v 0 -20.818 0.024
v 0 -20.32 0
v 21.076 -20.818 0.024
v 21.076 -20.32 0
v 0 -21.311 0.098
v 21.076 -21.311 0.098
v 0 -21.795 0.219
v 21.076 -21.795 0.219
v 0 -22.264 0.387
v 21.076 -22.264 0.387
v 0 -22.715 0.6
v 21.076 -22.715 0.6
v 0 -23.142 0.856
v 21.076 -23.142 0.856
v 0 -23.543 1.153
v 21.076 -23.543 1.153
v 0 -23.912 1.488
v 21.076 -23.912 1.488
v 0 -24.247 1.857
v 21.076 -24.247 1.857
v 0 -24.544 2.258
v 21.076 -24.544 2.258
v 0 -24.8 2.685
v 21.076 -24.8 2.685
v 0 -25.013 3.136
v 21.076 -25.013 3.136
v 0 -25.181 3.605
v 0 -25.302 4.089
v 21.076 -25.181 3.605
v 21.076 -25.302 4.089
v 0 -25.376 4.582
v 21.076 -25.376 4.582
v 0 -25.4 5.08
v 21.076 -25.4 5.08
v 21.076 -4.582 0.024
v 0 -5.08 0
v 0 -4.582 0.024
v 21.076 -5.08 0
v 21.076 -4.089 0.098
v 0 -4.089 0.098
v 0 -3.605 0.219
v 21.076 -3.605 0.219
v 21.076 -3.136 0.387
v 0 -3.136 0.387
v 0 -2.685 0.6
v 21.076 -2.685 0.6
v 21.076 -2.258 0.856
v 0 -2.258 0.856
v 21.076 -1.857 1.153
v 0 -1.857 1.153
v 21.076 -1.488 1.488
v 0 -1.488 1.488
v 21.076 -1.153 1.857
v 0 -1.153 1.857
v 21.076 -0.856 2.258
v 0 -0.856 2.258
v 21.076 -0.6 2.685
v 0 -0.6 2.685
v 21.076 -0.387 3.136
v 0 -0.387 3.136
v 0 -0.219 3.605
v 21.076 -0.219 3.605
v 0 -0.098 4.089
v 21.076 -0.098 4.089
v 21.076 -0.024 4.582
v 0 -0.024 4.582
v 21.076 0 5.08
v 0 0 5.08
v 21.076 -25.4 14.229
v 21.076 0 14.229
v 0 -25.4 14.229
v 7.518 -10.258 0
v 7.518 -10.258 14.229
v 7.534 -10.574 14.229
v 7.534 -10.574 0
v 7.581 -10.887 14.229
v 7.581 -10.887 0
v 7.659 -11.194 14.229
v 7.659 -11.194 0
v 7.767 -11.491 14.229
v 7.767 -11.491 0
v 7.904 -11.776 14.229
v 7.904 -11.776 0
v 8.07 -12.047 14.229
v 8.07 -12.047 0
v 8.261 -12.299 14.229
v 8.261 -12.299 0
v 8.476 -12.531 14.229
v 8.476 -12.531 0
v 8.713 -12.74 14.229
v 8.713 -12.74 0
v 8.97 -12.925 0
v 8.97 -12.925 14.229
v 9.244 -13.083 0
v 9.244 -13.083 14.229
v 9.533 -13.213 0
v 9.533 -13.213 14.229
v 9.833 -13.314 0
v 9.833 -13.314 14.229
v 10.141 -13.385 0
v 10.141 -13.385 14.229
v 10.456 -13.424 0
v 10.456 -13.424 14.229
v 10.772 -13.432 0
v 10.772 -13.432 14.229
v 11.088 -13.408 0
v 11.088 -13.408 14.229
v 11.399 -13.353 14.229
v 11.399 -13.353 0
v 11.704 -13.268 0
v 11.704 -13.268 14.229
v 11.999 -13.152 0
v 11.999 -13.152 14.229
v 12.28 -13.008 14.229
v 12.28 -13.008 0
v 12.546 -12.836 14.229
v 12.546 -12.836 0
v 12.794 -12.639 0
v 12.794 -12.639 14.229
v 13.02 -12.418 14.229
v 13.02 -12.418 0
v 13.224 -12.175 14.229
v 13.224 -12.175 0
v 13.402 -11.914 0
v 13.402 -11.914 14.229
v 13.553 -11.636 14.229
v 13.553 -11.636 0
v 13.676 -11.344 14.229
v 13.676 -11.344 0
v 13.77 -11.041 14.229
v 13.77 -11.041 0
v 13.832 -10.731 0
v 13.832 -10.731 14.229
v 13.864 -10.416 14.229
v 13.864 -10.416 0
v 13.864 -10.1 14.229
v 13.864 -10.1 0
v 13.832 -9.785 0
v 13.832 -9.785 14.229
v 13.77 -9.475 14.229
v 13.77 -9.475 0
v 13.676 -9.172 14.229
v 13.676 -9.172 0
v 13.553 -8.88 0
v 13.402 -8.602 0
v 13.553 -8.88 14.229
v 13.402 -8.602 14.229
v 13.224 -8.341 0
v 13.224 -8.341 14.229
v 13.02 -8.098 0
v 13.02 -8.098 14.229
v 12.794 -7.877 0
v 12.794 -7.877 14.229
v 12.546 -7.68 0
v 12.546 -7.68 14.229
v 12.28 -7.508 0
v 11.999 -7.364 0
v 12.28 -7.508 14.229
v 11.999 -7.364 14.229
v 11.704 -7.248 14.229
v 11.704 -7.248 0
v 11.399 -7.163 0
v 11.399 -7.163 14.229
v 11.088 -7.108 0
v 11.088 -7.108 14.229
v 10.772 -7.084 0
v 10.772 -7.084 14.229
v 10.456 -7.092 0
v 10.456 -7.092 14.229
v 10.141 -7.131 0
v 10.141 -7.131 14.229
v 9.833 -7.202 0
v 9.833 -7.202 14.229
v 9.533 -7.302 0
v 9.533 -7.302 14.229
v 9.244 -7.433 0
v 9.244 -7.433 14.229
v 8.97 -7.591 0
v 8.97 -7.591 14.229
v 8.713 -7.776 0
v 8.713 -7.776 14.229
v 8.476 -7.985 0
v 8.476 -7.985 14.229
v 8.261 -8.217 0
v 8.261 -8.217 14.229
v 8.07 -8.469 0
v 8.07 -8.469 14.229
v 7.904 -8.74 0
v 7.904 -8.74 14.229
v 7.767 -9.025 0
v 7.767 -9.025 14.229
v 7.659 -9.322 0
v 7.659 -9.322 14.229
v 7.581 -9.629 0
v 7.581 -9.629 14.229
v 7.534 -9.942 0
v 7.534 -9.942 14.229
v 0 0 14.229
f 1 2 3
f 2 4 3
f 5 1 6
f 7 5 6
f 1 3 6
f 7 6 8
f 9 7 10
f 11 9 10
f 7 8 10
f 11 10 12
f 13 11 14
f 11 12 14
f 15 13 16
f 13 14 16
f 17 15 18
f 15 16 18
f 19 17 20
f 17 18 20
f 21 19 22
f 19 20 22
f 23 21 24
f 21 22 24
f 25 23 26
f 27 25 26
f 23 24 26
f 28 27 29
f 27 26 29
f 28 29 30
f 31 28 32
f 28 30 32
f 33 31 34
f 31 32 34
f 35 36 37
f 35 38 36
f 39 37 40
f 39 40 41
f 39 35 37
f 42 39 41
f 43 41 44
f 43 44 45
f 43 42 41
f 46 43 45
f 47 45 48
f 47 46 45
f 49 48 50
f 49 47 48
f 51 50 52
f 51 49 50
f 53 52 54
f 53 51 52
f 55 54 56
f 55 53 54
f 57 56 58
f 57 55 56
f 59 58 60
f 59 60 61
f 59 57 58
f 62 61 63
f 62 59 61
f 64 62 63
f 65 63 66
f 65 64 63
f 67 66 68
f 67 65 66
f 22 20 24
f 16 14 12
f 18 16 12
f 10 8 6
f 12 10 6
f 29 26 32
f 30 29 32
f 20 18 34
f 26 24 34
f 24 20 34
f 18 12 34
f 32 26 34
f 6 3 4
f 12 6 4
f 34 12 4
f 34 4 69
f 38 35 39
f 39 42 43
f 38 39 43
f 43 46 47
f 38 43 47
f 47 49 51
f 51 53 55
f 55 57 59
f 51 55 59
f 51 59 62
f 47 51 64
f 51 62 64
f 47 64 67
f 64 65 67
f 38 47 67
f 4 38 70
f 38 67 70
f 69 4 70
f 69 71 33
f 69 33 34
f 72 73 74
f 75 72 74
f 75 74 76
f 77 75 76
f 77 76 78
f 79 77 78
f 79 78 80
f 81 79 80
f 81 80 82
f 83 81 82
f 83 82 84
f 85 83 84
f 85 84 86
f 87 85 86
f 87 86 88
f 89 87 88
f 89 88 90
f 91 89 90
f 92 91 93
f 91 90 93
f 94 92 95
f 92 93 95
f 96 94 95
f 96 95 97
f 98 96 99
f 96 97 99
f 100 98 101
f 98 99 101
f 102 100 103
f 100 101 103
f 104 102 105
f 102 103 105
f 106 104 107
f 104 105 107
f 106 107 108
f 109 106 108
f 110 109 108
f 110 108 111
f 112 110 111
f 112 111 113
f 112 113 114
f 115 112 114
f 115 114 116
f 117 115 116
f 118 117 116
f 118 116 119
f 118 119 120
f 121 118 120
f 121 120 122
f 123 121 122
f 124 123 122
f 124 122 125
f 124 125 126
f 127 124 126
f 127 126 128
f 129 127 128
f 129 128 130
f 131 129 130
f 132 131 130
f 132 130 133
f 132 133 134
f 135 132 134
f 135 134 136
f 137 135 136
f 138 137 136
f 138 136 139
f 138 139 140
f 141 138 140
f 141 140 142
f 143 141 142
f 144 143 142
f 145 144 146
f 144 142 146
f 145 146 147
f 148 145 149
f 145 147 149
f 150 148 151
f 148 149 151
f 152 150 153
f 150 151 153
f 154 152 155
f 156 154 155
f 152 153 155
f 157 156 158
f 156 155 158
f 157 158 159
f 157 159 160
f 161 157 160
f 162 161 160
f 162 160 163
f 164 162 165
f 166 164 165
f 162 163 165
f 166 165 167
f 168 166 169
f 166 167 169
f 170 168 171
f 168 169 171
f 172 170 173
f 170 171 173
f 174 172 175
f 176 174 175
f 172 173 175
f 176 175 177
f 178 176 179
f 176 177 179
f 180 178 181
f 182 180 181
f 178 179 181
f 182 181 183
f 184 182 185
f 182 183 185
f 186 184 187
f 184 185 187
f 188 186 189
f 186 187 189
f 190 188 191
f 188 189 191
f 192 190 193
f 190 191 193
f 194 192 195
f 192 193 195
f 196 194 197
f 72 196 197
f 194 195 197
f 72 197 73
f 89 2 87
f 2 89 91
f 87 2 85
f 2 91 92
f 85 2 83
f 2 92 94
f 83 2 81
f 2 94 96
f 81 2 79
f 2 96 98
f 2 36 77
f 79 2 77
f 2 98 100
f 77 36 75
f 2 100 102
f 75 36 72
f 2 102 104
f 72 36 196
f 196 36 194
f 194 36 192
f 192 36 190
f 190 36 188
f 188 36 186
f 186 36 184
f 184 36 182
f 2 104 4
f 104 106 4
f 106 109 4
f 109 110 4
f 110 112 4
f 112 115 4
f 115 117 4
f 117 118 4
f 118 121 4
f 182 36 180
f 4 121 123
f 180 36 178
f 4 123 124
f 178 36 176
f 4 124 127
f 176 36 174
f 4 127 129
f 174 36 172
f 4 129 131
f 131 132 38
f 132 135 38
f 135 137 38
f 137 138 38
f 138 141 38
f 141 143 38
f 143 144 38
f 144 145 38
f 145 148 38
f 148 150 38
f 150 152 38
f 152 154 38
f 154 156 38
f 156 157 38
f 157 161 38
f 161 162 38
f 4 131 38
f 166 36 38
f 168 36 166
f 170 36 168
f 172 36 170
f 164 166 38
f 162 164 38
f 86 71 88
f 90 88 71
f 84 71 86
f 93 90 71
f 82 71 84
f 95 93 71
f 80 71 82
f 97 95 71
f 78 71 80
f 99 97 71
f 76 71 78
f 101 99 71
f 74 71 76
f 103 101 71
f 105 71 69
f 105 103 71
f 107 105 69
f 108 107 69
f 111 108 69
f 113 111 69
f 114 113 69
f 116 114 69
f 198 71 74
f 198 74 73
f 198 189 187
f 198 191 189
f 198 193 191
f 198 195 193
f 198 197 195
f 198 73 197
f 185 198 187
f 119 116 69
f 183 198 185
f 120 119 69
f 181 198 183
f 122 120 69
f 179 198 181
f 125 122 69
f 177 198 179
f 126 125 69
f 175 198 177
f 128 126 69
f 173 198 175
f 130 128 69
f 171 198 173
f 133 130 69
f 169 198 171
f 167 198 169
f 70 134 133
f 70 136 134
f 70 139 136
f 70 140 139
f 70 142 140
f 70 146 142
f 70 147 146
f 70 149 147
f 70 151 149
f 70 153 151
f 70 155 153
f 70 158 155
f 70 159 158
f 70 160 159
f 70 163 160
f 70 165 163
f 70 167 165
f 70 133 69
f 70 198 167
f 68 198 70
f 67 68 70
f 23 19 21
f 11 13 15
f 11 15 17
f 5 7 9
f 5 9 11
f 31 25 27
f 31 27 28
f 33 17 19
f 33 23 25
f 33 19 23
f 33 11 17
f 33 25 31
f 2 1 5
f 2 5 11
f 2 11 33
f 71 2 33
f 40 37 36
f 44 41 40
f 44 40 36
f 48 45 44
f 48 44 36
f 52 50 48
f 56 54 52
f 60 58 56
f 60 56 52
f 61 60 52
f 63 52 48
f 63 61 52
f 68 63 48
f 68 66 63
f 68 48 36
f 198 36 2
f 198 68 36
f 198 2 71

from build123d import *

# Parameters (mm, degrees)
F0_W     = 21.076461
F0_H     = 14.229262
F1_DEPTH = 25.4
F2_R     = 5.08
F4_D     = 6.35
F5_R     = 5.08


with BuildPart() as f1:
    # F0 (on Front) → F1 (new body)
    with BuildSketch(Plane.XZ):
        with Locations((10.53823, 7.114631)):
            Rectangle(F0_W, F0_H)
    extrude(amount=F1_DEPTH)

    # F2
    f2_edges = [f1.edges().sort_by_distance(p)[0] for p in [
        (10.538231, -25.4, 0),
    ]]
    fillet(f2_edges, radius=F2_R)

    # F4 (through all)
    with Locations(Plane(origin=(0, 0, 0), x_dir=(1, 0, 0), z_dir=(0, 0, -1))):
        with Locations((10.692811, 10.257974)):
            Hole(F4_D / 2)

    # F5
    f5_edges = [f1.edges().sort_by_distance(p)[0] for p in [
        (10.538231, 0, 0),
    ]]
    fillet(f5_edges, radius=F5_R)


solid = f1.part
